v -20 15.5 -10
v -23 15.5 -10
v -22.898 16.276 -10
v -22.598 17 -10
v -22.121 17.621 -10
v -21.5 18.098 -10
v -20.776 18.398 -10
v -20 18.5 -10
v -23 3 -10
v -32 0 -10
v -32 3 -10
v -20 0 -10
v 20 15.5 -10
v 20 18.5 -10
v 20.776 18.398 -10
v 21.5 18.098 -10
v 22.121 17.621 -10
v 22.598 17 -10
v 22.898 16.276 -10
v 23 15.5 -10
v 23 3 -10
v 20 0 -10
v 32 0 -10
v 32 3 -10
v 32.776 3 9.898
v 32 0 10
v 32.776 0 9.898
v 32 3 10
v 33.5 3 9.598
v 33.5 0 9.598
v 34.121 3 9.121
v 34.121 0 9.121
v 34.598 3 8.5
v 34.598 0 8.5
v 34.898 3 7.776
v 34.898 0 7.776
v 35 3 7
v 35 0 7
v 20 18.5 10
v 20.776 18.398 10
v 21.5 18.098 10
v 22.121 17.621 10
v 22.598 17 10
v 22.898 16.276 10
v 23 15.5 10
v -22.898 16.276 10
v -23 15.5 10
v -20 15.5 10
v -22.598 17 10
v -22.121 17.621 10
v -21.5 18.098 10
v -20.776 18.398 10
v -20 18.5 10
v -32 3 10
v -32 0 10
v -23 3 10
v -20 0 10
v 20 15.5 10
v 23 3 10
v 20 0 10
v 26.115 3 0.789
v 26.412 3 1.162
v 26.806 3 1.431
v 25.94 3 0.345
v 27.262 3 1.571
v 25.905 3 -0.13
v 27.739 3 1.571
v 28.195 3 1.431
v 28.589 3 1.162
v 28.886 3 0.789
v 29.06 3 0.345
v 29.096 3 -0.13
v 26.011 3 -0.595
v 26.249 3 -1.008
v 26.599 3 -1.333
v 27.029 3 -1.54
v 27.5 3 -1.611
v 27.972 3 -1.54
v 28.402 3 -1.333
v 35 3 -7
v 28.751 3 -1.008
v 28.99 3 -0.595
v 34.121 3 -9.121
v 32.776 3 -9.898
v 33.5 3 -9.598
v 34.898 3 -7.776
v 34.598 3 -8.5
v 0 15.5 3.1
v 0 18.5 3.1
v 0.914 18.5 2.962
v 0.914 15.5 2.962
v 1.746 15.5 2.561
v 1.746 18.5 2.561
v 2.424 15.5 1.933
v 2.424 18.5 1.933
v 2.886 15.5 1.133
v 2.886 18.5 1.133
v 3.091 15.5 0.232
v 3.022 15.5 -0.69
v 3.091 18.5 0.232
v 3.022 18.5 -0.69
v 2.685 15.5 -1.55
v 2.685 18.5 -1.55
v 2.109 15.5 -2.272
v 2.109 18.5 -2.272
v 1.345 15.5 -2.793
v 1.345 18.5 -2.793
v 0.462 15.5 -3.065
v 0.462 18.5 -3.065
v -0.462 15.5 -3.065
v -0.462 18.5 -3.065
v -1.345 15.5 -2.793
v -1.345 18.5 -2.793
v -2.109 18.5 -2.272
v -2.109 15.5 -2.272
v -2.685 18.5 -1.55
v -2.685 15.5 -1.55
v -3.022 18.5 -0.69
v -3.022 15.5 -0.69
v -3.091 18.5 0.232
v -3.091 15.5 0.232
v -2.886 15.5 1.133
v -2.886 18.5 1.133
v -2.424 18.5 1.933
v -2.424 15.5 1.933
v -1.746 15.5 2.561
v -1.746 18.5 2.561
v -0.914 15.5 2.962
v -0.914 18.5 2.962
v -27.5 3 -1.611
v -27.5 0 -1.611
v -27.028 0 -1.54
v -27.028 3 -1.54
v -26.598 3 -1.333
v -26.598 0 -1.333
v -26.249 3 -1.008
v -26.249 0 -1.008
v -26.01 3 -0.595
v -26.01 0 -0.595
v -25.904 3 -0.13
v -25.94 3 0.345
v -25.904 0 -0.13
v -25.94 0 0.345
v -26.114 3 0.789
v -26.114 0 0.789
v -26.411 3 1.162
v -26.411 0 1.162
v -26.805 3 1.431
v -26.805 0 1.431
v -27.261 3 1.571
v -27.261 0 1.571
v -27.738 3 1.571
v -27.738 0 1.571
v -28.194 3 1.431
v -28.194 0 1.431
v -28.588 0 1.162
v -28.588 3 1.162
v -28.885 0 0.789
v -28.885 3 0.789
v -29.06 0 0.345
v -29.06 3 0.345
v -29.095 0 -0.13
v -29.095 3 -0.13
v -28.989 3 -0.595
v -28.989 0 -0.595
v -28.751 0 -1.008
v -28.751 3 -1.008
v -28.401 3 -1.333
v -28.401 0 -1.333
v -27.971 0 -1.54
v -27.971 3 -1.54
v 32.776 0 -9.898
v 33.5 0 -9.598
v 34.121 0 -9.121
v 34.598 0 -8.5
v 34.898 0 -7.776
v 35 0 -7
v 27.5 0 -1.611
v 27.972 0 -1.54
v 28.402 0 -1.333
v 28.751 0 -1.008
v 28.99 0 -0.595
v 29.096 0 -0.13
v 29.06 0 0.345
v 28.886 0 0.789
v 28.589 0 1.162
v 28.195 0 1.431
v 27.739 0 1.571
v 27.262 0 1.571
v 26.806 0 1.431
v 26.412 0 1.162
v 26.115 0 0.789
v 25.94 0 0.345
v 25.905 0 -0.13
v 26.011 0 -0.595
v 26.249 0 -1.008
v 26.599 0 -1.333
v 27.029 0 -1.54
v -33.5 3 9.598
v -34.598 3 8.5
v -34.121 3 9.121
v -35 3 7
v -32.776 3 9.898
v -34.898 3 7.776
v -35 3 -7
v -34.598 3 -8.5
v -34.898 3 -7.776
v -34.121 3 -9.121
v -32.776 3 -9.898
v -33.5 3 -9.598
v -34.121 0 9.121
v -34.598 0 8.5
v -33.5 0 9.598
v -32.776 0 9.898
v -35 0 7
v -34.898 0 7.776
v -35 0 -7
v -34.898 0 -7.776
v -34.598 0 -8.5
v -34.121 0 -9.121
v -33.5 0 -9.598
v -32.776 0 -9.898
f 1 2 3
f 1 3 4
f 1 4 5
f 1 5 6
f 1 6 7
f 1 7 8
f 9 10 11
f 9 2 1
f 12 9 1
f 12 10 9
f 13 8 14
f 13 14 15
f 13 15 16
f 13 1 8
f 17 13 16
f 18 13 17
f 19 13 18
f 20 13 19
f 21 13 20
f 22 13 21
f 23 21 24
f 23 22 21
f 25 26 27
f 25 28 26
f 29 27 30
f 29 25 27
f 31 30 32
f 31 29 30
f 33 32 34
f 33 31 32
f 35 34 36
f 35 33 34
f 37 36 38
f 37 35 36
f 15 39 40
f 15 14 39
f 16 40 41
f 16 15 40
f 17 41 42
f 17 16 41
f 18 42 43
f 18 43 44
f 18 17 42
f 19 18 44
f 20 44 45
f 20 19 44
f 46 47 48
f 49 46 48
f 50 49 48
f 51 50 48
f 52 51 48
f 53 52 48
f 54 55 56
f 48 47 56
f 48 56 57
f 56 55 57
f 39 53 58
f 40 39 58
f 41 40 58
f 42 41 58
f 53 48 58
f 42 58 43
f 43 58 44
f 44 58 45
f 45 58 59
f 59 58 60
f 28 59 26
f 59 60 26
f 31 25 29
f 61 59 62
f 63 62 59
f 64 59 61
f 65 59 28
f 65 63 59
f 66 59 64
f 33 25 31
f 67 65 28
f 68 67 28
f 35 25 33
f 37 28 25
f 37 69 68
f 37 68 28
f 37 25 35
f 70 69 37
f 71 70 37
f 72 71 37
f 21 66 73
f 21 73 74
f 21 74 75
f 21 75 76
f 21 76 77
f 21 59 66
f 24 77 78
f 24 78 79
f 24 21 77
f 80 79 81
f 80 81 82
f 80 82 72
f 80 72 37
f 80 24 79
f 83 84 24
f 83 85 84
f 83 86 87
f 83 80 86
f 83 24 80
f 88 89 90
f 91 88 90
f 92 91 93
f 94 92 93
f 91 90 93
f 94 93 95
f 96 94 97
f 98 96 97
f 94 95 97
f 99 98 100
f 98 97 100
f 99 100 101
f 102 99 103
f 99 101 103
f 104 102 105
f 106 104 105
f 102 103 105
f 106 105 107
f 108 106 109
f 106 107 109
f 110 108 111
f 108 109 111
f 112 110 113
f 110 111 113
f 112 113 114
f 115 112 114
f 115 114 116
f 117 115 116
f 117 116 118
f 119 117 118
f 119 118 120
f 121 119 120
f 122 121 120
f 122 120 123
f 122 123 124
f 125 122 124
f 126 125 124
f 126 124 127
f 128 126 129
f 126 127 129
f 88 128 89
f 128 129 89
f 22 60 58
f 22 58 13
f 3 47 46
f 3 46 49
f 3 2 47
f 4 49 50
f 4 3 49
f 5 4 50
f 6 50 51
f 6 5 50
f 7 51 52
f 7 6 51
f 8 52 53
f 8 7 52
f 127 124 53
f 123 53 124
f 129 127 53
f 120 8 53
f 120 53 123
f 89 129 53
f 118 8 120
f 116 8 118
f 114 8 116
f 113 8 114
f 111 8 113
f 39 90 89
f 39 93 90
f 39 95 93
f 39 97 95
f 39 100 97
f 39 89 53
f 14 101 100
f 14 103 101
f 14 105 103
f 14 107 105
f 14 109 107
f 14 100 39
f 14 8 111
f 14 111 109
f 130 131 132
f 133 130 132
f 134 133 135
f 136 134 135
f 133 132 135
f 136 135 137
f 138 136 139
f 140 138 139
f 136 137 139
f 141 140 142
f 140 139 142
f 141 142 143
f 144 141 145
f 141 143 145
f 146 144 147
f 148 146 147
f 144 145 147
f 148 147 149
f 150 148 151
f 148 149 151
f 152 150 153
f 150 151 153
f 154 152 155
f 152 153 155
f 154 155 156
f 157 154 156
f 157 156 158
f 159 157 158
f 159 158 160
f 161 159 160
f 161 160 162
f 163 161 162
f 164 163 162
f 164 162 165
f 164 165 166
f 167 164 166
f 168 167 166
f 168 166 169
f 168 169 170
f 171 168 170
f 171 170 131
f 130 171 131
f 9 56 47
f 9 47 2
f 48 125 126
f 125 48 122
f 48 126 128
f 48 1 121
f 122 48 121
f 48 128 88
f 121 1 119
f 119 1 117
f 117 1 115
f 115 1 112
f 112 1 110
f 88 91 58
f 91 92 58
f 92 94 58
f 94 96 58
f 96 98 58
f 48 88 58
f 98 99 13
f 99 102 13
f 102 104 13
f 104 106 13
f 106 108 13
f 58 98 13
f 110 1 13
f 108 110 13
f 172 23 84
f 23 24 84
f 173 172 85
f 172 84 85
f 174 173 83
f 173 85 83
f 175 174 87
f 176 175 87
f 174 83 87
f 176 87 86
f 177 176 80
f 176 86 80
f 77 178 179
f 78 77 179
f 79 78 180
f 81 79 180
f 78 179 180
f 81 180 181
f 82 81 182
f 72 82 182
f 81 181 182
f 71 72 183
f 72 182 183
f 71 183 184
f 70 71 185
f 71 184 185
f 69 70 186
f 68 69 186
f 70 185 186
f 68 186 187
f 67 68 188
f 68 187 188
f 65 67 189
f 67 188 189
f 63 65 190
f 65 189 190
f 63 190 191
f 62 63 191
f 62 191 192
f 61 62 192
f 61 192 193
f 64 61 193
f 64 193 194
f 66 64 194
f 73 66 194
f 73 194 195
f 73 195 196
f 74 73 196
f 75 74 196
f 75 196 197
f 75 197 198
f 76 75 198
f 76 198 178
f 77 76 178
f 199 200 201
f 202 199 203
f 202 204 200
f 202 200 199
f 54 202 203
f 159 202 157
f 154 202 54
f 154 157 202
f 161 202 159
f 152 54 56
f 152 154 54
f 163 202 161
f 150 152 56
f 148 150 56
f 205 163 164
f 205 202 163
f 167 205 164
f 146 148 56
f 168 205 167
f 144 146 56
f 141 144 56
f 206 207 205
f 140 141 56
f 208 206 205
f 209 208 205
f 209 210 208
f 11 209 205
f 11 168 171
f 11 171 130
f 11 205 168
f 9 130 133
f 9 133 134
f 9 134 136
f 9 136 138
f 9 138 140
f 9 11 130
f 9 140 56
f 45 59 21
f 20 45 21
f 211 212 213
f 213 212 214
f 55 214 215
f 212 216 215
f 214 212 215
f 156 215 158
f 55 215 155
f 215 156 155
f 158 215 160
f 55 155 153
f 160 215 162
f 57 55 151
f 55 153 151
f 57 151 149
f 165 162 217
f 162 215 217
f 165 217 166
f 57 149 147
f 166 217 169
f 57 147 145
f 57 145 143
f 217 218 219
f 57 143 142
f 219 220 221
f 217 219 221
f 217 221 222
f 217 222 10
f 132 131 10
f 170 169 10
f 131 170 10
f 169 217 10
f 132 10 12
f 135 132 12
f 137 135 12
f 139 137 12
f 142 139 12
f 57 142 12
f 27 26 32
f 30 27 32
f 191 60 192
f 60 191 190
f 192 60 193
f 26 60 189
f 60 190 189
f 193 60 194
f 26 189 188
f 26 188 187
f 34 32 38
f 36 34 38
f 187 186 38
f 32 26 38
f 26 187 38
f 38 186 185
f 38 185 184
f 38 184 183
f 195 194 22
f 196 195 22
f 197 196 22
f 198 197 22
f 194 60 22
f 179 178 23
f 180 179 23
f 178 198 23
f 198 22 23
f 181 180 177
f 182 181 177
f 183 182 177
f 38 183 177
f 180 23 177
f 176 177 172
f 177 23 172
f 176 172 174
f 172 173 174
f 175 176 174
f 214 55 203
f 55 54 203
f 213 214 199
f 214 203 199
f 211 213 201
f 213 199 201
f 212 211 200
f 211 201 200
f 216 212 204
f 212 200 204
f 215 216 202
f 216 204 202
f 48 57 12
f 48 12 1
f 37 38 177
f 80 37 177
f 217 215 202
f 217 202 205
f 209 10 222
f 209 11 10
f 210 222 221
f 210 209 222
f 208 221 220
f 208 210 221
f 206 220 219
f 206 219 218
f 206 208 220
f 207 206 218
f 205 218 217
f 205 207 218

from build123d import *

# Parameters (mm, degrees)
SKETCH1_W           = 70
SKETCH1_H           = 20
BOSS_EXTRUDE2_DEPTH = 3
SKETCH3_W           = 3
SKETCH3_H           = 20
BOSS_EXTRUDE3_DEPTH = 18
SKETCH4_W           = 46
SKETCH4_H           = 20
BOSS_EXTRUDE4_DEPTH = 3
SKETCH5_W           = 40
SKETCH5_H           = 3
CUT_EXTRUDE2_DEPTH  = 47.914816423
SKETCH6_R           = 3.1
CUT_EXTRUDE3_DEPTH  = 43.023802779
FILLET2_R           = 3
SKETCH7_R           = 1.6
CUT_EXTRUDE4_DEPTH  = 44.600458713
CUT_EXTRUDE5_DEPTH  = 26
SKETCH10_W          = 46
SKETCH10_H          = 20
BOSS_EXTRUDE5_DEPTH = 3
SKETCH11_R          = 3.1
CUT_EXTRUDE6_DEPTH  = 3
FILLET3_R           = 3


with BuildPart() as part:
    # Sketch1 → Boss-Extrude2 (new body)
    with BuildSketch(Plane(origin=(0, 0, 0), x_dir=(1, 0, 0), z_dir=(0, 1, 0))):
        Rectangle(SKETCH1_W, SKETCH1_H)
    extrude(amount=BOSS_EXTRUDE2_DEPTH)

    # Sketch3 → Boss-Extrude3 (add)
    with BuildSketch(Plane(origin=(0, 3, 0), x_dir=(1, 0, 0), z_dir=(0, 1, 0))):
        with Locations((21.5, 0)):
            Rectangle(SKETCH3_W, SKETCH3_H)
        with Locations((-21.5, 0)):
            Rectangle(SKETCH3_W, SKETCH3_H)
    extrude(amount=BOSS_EXTRUDE3_DEPTH)

    # Sketch4 → Boss-Extrude4 (add)
    with BuildSketch(Plane(origin=(0, 21, 0), x_dir=(1, 0, 0), z_dir=(0, 1, 0))):
        Rectangle(SKETCH4_W, SKETCH4_H)
    extrude(amount=BOSS_EXTRUDE4_DEPTH)

    # Sketch5 → Cut-Extrude2 (cut, through all)
    with BuildSketch(Plane.XY.offset(10)):
        with Locations((0, 1.5)):
            Rectangle(SKETCH5_W, SKETCH5_H)
    extrude(amount=-CUT_EXTRUDE2_DEPTH, mode=Mode.SUBTRACT)

    # Sketch6 → Cut-Extrude3 (cut, through all)
    with BuildSketch(Plane.XZ.offset(-21)):
        with Locations(Location((0, 0, 0), (0, 0, 270))):
            Circle(SKETCH6_R)
    extrude(amount=-CUT_EXTRUDE3_DEPTH, mode=Mode.SUBTRACT)

    # Fillet2
    fillet2_edges = [part.edges().sort_by_distance(p)[0] for p in [
        (-23, 24, 0),
        (23, 24, 0),
        (35, 1.5, 10),
        (-35, 1.5, 10),
        (-35, 1.5, -10),
        (35, 1.5, -10),
    ]]
    fillet(fillet2_edges, radius=FILLET2_R)

    # Sketch7 → Cut-Extrude4 (cut, through all)
    with BuildSketch(Plane.XZ):
        with Locations(Location((-27.499620905, -0.010826829, 0), (0, 0, 270))):
            Circle(SKETCH7_R)
        with Locations(Location((27.500379095, -0.010826829, 0), (0, 0, 270))):
            Circle(SKETCH7_R)
    extrude(amount=-CUT_EXTRUDE4_DEPTH, mode=Mode.SUBTRACT)

    # Sketch9 → Cut-Extrude5 (cut)
    with BuildSketch(Plane.XY.offset(10)):
        Polygon((0, 15.5), (-23, 15.5), (-23, 32.171258166), (25.72707431, 32.171258166), (25.72707431, 15.5), align=None)
    extrude(amount=-CUT_EXTRUDE5_DEPTH, mode=Mode.SUBTRACT)


with BuildPart() as cut_extrude5_piece_1:
    # of the separate pieces the step leaves, piece 1, a body of its own (cut_extrude5_pieces)
    add(part.part.solids().sort_by_distance((20, 15.5, 10))[0])



with BuildPart() as cut_extrude5_piece_2:
    # of the separate pieces the step leaves, piece 2, a body of its own (cut_extrude5_pieces)
    add(part.part.solids().sort_by_distance((-32, 0, 10))[0])


with BuildPart() as cut_extrude5_piece_1_1:
    add(cut_extrude5_piece_1.part)

    add(cut_extrude5_piece_2.part)  # Boss-Extrude5 merges Cut-Extrude5 piece 2
    # Sketch10 → Boss-Extrude5 (add)
    with BuildSketch(Plane(origin=(0, 15.5, 0), x_dir=(1, 0, 0), z_dir=(0, 1, 0))):
        Rectangle(SKETCH10_W, SKETCH10_H)
    extrude(amount=BOSS_EXTRUDE5_DEPTH)

    # Sketch11 → Cut-Extrude6 (cut)
    with BuildSketch(Plane(origin=(0, 18.5, 0), x_dir=(1, 0, 0), z_dir=(0, 1, 0))):
        with Locations(Location((0, 0, 0), (0, 0, 270))):
            Circle(SKETCH11_R)
    extrude(amount=-CUT_EXTRUDE6_DEPTH, mode=Mode.SUBTRACT)

    # Fillet3
    fillet3_edges = [cut_extrude5_piece_1_1.edges().sort_by_distance(p)[0] for p in [
        (-23, 18.5, 0),
        (23, 18.5, 0),
    ]]
    fillet(fillet3_edges, radius=FILLET3_R)


solid = cut_extrude5_piece_1_1.part
